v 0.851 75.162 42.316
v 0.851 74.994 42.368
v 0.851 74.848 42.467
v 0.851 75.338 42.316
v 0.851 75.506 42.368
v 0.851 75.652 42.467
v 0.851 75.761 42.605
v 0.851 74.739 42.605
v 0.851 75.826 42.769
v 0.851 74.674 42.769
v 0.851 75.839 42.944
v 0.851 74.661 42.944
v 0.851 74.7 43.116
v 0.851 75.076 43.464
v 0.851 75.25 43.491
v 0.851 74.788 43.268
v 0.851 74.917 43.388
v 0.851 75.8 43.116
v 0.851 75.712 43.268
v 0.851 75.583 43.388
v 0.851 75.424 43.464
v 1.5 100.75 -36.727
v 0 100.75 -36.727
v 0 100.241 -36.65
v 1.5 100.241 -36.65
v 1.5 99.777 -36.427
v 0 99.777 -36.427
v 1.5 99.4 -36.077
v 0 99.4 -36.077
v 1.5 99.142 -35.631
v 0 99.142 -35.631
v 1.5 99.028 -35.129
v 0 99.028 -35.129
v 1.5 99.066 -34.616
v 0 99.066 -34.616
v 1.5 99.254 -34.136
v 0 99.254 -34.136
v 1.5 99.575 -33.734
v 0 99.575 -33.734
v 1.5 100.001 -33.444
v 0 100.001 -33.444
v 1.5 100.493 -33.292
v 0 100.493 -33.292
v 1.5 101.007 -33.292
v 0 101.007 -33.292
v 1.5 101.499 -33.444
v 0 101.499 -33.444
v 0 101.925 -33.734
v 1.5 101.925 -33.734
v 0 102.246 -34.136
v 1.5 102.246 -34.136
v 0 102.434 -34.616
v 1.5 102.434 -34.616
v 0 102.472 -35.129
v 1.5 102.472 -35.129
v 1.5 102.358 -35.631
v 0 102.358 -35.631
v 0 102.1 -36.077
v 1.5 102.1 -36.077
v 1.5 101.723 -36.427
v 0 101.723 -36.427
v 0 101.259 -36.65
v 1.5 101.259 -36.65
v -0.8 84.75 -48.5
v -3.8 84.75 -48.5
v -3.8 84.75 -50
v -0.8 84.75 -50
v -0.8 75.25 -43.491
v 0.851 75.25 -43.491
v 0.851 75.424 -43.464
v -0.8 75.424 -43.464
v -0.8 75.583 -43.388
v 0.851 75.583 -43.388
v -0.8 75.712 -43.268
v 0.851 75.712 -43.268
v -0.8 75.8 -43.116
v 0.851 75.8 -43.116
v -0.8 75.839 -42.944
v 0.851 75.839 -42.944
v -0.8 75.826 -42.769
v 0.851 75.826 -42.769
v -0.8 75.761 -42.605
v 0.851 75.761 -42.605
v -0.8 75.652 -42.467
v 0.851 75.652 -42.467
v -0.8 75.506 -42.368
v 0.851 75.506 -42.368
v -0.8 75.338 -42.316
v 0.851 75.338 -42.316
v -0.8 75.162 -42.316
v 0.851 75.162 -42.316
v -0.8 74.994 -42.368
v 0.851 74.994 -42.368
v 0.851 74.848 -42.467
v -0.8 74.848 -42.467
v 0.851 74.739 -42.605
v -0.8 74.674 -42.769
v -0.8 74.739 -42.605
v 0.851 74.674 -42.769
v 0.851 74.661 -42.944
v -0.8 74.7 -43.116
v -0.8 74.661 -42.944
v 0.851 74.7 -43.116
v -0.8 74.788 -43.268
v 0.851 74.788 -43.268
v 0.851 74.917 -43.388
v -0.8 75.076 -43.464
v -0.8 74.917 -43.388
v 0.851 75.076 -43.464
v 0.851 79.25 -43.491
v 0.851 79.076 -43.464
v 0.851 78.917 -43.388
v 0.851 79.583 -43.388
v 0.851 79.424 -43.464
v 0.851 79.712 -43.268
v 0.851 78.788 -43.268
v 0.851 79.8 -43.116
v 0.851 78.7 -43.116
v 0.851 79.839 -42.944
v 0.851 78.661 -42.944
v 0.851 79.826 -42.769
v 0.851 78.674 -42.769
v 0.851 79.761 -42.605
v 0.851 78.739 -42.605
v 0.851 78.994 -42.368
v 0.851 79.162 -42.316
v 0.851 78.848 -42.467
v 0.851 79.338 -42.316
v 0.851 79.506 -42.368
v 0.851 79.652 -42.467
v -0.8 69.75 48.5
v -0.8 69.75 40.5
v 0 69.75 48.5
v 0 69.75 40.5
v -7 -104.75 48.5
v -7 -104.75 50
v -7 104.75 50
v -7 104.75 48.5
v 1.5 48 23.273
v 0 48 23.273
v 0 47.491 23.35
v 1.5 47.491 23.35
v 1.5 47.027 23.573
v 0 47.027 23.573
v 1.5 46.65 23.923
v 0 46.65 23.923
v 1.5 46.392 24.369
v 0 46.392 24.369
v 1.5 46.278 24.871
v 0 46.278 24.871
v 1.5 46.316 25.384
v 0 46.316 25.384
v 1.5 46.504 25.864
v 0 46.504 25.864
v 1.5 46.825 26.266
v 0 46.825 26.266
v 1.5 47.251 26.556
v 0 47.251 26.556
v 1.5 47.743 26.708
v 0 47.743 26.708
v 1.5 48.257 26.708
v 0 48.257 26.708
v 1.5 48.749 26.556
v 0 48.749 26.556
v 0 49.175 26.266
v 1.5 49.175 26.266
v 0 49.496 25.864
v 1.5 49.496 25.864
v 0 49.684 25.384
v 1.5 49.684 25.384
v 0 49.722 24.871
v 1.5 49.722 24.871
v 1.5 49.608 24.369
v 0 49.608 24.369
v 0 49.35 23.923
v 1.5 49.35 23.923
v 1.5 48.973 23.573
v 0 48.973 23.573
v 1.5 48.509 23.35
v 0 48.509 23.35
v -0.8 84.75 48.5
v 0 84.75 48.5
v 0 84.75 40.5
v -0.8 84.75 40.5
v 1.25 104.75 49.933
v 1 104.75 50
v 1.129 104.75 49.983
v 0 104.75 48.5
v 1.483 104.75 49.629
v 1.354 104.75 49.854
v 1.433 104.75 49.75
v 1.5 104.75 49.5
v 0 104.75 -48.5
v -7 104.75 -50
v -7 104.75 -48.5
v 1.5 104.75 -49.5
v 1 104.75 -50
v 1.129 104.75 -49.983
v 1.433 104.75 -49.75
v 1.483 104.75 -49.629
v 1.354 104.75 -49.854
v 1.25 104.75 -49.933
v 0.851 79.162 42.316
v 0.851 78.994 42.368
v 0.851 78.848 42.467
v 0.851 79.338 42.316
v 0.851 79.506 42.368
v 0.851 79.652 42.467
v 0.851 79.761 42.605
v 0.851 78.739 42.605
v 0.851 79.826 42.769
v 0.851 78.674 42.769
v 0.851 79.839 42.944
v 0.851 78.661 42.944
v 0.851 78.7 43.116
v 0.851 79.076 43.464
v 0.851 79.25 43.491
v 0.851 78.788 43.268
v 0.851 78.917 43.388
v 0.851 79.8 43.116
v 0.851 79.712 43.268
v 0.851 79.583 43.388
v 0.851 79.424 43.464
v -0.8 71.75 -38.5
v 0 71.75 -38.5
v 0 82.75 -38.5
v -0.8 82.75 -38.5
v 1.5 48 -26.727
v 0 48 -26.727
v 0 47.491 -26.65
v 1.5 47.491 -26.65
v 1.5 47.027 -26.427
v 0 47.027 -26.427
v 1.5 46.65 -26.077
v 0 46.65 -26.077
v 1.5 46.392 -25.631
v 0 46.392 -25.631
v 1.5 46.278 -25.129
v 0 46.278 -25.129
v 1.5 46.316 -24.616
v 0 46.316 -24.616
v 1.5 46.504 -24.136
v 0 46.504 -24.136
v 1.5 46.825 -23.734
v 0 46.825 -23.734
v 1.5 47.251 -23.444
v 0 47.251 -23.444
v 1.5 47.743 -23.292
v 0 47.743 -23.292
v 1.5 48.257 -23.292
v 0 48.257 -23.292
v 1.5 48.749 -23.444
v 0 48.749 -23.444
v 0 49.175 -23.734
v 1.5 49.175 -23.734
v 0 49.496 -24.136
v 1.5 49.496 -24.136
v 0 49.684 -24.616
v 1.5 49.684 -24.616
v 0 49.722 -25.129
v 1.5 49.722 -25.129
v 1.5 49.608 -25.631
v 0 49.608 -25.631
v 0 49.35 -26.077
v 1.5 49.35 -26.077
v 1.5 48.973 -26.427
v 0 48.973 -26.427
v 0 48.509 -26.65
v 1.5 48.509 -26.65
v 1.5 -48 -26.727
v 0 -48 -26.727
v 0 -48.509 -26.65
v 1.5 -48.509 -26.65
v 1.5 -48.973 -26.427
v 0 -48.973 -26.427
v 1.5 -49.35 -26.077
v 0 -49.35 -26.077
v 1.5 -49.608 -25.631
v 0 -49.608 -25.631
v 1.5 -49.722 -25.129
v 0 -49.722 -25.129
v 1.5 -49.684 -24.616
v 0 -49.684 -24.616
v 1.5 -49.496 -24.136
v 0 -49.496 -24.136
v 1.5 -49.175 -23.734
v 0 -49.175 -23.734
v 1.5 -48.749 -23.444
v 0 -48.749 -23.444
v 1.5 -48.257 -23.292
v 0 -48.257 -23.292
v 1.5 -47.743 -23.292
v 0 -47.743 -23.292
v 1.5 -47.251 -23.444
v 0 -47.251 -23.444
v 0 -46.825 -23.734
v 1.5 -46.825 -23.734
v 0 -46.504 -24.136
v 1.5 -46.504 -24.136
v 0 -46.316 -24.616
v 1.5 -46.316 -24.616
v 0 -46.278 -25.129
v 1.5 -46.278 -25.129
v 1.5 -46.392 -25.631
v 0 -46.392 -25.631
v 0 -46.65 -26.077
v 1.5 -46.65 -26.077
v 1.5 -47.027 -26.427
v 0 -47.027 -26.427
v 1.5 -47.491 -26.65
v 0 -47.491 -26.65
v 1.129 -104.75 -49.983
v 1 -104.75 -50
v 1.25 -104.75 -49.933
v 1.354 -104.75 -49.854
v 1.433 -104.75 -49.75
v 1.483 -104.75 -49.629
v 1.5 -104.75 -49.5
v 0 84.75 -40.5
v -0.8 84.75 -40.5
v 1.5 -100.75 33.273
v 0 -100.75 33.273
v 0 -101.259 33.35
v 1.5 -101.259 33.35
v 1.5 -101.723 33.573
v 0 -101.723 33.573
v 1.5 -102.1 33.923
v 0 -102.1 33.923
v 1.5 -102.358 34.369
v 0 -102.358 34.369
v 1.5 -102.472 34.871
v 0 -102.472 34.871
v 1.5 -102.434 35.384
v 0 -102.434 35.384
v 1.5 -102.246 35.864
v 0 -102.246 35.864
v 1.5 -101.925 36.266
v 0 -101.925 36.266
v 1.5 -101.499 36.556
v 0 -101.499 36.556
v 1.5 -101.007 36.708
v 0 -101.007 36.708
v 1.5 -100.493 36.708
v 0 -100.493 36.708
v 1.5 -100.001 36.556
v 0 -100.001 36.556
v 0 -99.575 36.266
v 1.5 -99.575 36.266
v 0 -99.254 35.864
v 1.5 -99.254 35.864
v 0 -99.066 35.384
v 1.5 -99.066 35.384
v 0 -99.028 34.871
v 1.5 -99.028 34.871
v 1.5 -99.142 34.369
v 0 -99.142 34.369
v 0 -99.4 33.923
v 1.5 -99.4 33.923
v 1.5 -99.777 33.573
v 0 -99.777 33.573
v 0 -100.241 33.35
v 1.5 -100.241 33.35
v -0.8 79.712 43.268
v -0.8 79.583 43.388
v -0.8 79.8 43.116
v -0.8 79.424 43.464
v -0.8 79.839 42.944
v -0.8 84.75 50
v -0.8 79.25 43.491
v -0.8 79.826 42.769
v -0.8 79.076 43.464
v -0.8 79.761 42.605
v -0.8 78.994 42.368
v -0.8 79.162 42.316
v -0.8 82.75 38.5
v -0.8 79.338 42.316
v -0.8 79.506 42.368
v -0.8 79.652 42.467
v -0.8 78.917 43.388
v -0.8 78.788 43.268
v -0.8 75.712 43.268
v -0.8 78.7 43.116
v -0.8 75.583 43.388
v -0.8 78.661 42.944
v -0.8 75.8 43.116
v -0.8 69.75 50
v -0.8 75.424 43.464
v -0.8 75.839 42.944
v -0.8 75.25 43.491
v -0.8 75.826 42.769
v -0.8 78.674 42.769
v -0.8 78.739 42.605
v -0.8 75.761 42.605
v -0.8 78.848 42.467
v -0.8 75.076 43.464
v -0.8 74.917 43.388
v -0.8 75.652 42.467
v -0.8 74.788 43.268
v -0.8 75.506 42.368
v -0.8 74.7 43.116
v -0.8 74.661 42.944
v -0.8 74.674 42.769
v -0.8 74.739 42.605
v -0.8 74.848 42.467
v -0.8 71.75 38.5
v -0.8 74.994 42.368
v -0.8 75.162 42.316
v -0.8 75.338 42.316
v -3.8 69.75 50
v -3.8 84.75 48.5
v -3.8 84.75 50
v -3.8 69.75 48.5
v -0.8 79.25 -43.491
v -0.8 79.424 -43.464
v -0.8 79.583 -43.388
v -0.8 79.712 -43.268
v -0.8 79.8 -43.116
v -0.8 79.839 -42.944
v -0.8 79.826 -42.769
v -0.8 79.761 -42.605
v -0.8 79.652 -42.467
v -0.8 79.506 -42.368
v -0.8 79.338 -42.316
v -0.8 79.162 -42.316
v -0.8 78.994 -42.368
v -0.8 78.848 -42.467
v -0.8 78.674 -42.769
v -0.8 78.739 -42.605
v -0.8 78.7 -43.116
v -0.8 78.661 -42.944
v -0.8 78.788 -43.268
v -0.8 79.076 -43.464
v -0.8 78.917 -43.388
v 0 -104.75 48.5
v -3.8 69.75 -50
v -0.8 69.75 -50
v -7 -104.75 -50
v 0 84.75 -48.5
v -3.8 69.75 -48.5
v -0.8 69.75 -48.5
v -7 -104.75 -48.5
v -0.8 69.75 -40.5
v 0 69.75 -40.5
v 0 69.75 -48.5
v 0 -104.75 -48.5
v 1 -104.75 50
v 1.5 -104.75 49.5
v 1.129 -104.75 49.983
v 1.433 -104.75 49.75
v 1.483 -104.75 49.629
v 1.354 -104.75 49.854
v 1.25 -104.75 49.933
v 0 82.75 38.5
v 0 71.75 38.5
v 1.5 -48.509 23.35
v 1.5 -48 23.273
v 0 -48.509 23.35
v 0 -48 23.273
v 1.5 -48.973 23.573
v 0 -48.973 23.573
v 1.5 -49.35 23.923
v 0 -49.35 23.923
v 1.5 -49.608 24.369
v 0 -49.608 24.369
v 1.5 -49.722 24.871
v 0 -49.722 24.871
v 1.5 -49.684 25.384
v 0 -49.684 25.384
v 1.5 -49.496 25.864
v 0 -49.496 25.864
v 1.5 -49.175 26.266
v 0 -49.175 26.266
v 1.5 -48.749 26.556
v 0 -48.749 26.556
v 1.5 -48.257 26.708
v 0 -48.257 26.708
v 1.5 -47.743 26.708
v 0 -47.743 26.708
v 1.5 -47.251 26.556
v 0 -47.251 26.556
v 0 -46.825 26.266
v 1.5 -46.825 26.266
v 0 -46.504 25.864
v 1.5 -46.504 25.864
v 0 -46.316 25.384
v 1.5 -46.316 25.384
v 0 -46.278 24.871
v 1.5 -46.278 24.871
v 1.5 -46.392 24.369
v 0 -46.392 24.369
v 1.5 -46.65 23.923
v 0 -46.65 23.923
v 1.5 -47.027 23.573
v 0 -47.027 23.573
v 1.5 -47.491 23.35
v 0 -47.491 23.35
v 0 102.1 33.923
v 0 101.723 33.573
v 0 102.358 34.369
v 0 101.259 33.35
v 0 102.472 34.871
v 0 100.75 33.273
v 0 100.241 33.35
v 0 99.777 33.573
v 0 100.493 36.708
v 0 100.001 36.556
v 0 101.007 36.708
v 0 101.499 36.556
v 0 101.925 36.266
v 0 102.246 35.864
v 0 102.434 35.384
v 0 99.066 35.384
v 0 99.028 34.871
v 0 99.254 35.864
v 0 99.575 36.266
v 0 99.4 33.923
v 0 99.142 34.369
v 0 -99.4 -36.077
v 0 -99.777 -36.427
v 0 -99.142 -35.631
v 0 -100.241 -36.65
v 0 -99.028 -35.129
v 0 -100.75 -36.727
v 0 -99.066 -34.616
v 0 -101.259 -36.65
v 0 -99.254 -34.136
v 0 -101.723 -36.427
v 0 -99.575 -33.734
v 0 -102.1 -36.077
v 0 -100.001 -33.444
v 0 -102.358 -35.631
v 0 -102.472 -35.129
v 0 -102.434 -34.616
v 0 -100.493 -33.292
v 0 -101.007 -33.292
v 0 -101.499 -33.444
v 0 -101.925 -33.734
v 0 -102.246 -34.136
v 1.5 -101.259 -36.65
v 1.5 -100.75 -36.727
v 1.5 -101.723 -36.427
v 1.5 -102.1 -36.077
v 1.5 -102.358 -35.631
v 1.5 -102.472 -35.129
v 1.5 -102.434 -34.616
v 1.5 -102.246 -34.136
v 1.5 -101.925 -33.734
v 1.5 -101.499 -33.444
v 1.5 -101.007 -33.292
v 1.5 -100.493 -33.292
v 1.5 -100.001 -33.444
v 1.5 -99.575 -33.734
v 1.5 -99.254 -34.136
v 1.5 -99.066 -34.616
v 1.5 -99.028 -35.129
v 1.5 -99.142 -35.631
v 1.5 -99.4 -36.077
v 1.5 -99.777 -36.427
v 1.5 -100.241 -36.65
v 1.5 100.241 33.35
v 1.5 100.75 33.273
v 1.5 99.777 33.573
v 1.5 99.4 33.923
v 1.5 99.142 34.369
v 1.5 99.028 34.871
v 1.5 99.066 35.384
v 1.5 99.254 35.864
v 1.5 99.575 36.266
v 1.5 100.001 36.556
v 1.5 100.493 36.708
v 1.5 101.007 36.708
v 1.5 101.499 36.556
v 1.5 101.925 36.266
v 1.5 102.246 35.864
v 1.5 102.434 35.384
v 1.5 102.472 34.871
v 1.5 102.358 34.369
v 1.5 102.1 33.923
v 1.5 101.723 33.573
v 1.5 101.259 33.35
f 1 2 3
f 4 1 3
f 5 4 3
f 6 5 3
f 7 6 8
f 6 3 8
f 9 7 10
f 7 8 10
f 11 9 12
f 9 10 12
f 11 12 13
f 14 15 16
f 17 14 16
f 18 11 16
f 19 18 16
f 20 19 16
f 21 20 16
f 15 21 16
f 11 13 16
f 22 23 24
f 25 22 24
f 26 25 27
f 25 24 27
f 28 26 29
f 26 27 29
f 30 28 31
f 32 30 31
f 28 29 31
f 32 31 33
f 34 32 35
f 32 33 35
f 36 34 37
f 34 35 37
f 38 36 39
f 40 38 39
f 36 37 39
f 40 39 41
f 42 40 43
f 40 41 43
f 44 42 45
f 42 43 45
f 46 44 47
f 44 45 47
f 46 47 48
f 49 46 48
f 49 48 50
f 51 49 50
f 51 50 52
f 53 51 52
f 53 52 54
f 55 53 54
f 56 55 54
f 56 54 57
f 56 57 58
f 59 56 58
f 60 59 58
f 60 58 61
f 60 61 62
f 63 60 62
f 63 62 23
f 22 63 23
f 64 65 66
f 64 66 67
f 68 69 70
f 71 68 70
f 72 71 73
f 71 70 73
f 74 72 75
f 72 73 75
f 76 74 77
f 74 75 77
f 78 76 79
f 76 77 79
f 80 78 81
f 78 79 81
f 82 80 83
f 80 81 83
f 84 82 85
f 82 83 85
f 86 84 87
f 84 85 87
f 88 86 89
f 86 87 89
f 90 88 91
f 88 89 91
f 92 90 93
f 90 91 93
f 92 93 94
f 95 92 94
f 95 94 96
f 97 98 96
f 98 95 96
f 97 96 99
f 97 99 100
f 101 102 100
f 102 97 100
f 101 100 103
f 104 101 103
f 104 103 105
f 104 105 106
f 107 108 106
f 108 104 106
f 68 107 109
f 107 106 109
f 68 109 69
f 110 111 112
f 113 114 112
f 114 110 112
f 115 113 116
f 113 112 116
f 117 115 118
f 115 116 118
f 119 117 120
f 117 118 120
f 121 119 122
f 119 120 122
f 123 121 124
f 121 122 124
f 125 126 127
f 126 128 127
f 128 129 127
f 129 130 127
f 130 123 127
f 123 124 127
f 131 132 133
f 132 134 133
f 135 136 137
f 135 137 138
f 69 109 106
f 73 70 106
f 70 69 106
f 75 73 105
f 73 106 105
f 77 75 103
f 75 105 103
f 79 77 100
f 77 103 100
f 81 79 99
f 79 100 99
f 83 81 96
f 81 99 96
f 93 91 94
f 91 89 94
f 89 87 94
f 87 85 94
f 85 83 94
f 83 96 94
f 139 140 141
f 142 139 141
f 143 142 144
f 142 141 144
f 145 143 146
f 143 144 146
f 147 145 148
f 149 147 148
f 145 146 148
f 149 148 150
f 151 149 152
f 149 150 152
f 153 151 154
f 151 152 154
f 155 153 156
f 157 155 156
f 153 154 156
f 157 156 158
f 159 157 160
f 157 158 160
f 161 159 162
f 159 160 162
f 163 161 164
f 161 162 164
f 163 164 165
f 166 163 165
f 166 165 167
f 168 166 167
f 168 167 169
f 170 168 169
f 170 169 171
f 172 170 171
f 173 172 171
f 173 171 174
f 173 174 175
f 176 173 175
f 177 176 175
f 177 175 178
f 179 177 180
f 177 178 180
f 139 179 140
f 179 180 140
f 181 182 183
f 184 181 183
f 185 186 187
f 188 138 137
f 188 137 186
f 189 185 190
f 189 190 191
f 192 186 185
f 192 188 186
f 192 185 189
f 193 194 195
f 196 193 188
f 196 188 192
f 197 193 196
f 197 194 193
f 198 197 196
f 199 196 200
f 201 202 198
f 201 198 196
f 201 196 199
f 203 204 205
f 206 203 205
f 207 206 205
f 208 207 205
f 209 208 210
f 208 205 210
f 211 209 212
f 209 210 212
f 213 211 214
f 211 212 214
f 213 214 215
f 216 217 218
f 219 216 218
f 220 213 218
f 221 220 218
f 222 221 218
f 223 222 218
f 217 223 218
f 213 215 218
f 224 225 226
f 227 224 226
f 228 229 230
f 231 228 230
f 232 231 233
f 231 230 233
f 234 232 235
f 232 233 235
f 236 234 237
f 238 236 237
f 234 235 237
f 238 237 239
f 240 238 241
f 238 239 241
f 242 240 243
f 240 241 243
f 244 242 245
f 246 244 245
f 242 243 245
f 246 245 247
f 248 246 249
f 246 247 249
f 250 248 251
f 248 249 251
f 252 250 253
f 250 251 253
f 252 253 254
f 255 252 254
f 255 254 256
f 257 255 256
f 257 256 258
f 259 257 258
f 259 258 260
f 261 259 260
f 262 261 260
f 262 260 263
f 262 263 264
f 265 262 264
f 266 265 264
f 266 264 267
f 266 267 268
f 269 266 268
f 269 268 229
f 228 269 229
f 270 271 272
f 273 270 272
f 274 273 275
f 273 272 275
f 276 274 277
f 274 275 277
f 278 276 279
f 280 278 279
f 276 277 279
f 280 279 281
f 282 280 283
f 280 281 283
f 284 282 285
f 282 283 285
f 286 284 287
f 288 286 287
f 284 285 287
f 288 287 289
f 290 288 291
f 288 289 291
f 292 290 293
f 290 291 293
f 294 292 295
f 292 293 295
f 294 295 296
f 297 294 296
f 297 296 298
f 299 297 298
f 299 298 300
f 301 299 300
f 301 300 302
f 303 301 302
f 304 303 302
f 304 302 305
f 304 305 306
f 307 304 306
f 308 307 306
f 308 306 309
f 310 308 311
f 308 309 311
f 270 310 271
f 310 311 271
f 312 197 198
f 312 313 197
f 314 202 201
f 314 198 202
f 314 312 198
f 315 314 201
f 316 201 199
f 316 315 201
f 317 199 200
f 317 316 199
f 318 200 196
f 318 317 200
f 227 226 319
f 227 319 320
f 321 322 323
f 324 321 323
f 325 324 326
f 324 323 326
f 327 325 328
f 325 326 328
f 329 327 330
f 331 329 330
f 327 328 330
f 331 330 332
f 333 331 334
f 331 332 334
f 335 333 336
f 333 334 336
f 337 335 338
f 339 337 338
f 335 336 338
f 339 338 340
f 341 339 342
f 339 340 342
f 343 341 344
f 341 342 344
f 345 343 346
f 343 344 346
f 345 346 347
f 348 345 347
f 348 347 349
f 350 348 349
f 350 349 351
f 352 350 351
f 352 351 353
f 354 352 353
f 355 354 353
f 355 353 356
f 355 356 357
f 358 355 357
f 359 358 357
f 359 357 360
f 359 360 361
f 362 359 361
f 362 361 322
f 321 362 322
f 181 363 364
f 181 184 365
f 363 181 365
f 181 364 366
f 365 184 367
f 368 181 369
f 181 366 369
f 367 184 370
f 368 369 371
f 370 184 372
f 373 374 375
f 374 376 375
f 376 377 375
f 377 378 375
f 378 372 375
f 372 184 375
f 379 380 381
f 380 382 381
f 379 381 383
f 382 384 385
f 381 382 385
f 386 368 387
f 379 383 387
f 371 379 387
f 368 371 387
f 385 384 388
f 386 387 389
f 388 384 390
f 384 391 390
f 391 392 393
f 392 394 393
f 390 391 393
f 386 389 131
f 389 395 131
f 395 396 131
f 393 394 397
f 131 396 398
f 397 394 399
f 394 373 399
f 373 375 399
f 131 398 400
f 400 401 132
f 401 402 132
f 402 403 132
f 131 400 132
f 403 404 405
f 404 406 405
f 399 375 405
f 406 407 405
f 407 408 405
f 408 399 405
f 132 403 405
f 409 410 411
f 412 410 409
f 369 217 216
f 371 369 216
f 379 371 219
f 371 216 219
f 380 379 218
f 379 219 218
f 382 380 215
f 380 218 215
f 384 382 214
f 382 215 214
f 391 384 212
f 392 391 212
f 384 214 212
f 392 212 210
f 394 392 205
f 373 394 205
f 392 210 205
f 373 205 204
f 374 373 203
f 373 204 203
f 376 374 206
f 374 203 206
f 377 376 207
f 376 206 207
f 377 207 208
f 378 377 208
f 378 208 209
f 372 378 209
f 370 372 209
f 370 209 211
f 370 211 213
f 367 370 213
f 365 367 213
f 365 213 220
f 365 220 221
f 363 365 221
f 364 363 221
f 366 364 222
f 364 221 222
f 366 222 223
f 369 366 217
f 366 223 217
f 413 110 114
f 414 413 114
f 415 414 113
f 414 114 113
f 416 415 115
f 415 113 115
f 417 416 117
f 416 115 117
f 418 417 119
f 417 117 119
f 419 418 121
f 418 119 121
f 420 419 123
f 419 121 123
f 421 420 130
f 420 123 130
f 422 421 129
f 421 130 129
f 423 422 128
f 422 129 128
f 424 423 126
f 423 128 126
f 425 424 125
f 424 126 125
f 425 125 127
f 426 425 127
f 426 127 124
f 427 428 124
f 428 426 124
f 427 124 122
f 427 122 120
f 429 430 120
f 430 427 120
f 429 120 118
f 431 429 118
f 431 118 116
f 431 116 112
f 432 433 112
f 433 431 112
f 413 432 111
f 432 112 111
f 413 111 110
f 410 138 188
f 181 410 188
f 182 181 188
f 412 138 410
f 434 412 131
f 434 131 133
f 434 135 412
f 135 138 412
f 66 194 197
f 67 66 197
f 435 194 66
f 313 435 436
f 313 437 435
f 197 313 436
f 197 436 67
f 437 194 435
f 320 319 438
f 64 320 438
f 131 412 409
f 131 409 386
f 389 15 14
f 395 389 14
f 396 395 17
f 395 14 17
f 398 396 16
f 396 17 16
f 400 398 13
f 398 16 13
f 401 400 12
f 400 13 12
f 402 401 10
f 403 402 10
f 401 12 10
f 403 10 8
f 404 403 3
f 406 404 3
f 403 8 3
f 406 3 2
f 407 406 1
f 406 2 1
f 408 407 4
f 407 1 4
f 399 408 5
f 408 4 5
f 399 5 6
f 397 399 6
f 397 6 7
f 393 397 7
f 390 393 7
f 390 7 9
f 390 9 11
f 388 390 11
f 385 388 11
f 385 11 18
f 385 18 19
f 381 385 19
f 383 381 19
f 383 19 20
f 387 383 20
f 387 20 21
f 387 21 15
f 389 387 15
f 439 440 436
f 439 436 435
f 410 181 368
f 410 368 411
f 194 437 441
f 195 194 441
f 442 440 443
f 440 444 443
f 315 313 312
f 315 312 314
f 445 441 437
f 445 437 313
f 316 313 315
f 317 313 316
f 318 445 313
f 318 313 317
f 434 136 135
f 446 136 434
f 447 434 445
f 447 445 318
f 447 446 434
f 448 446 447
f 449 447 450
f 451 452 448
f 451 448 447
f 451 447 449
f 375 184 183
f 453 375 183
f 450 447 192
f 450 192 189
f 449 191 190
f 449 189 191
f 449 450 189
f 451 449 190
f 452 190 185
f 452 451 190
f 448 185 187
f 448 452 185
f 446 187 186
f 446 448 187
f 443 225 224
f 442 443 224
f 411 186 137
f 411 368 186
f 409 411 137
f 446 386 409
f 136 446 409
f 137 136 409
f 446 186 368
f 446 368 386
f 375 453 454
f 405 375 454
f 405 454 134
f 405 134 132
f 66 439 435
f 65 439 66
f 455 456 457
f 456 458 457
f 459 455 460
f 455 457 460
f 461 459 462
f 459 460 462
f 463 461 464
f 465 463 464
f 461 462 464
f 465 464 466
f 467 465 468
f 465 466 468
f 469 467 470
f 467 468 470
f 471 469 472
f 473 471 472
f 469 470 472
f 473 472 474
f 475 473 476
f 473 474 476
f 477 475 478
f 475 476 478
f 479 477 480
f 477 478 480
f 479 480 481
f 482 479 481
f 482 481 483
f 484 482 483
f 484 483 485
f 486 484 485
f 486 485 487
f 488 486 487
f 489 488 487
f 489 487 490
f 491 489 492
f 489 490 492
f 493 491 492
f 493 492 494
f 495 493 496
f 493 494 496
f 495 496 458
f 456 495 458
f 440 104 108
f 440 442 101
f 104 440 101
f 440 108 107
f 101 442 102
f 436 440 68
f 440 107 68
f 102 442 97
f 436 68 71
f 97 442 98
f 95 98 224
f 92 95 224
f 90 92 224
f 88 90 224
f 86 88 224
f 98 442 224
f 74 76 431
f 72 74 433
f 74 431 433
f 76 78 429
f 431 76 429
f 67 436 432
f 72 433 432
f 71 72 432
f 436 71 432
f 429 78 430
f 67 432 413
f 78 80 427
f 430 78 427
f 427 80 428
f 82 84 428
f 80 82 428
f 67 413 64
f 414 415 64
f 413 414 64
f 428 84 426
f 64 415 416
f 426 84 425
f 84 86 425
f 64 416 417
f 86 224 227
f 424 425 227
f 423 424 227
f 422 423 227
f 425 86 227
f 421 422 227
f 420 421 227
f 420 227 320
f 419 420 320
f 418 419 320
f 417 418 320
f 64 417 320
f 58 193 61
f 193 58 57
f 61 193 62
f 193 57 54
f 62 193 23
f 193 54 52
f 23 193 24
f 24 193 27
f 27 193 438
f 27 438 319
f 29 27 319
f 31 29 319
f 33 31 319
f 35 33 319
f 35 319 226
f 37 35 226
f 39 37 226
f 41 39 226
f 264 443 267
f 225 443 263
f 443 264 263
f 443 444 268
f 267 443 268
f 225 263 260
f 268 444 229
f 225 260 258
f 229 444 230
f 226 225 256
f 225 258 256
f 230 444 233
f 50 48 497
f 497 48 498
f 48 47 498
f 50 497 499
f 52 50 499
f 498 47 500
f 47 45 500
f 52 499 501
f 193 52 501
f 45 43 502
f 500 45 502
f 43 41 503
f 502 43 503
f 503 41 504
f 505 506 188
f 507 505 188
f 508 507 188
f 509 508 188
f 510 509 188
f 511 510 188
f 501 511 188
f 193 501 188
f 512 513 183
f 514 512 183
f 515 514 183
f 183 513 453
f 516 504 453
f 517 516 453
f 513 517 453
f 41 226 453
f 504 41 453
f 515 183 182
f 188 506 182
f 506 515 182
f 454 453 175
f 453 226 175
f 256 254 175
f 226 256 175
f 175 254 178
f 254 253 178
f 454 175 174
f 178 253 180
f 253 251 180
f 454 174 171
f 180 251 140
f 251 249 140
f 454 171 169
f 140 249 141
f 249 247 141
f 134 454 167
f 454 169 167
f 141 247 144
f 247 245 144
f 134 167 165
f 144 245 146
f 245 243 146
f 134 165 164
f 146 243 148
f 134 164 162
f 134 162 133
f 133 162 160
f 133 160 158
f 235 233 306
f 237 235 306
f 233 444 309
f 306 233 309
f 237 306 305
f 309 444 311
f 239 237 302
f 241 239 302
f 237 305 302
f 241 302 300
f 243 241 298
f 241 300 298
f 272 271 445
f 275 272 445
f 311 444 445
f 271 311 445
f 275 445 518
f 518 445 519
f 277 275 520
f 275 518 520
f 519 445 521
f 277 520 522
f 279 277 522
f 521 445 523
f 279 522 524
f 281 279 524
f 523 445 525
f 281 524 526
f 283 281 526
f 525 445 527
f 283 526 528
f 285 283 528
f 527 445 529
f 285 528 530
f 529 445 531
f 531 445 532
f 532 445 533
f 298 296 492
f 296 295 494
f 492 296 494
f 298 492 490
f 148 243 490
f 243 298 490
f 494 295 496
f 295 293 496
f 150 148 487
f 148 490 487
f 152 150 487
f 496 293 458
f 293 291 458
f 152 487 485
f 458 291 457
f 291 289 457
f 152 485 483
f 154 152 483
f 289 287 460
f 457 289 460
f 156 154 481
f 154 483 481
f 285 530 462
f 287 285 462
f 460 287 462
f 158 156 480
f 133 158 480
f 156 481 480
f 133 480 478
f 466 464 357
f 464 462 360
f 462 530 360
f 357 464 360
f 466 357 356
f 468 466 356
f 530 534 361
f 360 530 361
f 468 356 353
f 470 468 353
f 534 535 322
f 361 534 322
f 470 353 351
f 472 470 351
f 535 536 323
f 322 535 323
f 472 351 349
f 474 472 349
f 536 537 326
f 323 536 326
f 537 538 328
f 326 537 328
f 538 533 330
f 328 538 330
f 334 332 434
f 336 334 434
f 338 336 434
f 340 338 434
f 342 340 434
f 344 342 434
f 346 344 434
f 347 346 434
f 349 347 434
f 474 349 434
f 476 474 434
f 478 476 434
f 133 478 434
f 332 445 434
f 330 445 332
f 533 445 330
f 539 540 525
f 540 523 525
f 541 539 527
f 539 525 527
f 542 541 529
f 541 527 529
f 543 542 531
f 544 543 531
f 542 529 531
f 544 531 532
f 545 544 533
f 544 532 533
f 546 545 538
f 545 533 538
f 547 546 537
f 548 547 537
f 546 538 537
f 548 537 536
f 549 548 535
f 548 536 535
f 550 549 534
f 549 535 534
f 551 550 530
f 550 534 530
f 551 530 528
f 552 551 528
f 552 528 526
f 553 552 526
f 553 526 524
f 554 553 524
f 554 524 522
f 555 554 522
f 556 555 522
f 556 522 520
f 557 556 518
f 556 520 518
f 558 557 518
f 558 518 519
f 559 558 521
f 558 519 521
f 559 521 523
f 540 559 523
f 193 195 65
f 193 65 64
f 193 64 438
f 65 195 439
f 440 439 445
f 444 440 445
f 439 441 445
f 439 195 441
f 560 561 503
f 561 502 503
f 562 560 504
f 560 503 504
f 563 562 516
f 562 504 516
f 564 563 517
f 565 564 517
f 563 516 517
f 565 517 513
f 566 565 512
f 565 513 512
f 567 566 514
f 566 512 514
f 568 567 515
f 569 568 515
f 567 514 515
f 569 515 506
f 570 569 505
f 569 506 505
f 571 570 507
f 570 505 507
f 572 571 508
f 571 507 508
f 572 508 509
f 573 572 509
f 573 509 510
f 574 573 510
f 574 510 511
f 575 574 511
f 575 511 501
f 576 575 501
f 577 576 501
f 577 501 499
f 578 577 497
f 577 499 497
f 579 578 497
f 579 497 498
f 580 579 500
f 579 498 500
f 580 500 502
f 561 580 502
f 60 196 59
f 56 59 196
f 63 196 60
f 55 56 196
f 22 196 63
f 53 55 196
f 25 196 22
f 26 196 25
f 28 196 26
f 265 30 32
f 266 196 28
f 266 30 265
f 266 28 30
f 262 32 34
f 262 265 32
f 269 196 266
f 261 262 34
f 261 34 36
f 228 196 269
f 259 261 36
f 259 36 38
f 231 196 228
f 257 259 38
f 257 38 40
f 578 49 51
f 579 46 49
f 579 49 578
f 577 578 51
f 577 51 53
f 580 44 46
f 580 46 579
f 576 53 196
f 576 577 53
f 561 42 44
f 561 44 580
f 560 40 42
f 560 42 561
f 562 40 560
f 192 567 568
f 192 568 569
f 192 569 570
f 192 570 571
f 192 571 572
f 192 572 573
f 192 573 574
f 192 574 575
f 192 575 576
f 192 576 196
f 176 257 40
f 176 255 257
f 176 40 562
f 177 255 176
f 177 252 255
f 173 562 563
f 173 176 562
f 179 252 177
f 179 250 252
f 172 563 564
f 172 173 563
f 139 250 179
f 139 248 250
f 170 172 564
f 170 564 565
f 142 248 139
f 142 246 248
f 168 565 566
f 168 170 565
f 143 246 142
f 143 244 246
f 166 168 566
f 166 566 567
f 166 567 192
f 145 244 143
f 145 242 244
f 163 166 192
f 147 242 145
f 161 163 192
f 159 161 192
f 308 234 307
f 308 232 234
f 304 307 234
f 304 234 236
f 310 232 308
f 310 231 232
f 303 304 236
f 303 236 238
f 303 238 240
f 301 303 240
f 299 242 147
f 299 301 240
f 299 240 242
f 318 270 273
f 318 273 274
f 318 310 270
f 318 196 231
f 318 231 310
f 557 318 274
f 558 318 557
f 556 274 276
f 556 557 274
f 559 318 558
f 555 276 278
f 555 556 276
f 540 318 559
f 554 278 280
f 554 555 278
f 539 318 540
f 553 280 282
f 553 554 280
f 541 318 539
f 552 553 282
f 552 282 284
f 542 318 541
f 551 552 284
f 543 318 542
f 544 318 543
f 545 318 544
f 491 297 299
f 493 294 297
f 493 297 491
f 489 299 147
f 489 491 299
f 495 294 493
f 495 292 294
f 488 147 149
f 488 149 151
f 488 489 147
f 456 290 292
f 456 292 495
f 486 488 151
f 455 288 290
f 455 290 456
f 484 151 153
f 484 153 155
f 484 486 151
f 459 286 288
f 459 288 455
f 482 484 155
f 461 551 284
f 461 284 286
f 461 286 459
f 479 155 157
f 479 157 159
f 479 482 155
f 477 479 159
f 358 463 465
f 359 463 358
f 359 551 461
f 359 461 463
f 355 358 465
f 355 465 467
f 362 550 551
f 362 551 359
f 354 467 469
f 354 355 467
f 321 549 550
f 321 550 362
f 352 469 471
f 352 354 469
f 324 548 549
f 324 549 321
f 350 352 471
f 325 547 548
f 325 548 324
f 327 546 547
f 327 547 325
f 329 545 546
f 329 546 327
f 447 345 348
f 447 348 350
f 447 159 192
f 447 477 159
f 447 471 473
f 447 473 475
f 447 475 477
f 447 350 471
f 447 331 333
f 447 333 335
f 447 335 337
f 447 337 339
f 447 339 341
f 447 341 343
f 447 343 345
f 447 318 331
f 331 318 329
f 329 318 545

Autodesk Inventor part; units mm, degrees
ref_plane "YZ Plane" through (0, 0, 0) normal (1, 0, 0) x (0, 1, 0)
ref_plane "XZ Plane" through (0, 0, 0) normal (0, 1, 0) x (-1, 0, 0)
ref_plane "XY Plane" through (0, 0, 0) normal (0, 0, 1) x (1, 0, 0)
sketch "Sketch1" plane through (0, 0, 0) normal (1, 0, 0) x (0, 1, 0)
  line L0 (48, 50) -> (-48, 50)
  line L1 (-48, 50) -> (-48, -50)
  line L2 (-48, -50) -> (48, -50)
  line L3 (48, -50) -> (48, 50)
  point P0 (0, 0)
  dimension "d0" = 96
  dimension "d1" = 100
  dimension "d2" = 50
  dimension "d3" = 48
extrude "Extrusion1" add sketch "Sketch1" along normal blind 1.5
sketch "Sketch2" plane through (0, -48, 50) normal (0, 0, 1) x (1, 0, 0)
  line L0 (0, 96) -> (1.5, 96) projected
  line L1 (1.5, 96) -> (-7, 96)
  line L2 (-7, 96) -> (-7, 0)
  line L3 (-7, 0) -> (1.5, 0)
  line L4 (1.5, 0) -> (1.5, 96)
  point P0 (0, 48)
  dimension "d6" = 8.5
  dimension "d7" = 96
extrude "Extrusion2" add sketch "Sketch2" against normal blind 1.5
mirror "Mirror1" about plane through (0, 0, 0) normal (0, 0, 1) of "Extrusion2"
fillet "Fillet1" radius 0.5 2 edges at (1.5, 0, 50) (1.5, 0, -50)
sketch "Sketch12" plane through (-7, -48, 48.5) normal (0, -1, 0) x (1, 0, 0)
  arc A0 (8, -98.5) -> (8.5, -98) centre (8, -98) ccw projected
  line L0 (8.5, 1) -> (8.5, -98) projected
  arc A1 (8.5, 1) -> (8, 1.5) centre (8, 1) ccw projected
  line L1 (0, 1.5) -> (8, 1.5) projected
  line L2 (0, 1.5) -> (0, 0) projected
  line L3 (7, 0) -> (0, 0) projected
  line L4 (7, 0) -> (7, -97) projected
  line L5 (7, -97) -> (0, -97) projected
  line L6 (0, -98.5) -> (0, -97) projected
  line L7 (0, -98.5) -> (8, -98.5) projected
  point P0 (7, -48.5)
extrude "Extrusion8" add sketch "Sketch12" along normal blind 56.75
sketch "Sketch13" plane through (-7, 48, 48.5) normal (0, 1, 0) x (1, 0, 0)
  arc A0 (8.5, 98) -> (8, 98.5) centre (8, 98) ccw projected
  line L0 (0, 98.5) -> (8, 98.5) projected
  line L1 (0, 98.5) -> (0, 97) projected
  line L2 (0, 97) -> (7, 97) projected
  line L3 (7, 97) -> (7, 0) projected
  line L4 (0, 0) -> (7, 0) projected
  line L5 (0, -1.5) -> (0, 0) projected
  line L6 (8, -1.5) -> (0, -1.5) projected
  arc A1 (8, -1.5) -> (8.5, -1) centre (8, -1) ccw projected
  line L7 (8.5, 98) -> (8.5, -1) projected
  point P0 (7, 48.5)
extrude "Extrusion9" add sketch "Sketch13" along normal blind 56.75
sketch "Sketch14" plane through (1.5, 0, 0) normal (1, 0, 0) x (0, 0, -1)
  line L0 (49.5, -104.75) -> (49.5, 104.75) projected
  line L1 (-49.5, 104.75) -> (49.5, 104.75) projected
  line L2 (-49.5, 104.75) -> (-49.5, -104.75) projected
  line L3 (49.5, -104.75) -> (-49.5, -104.75) projected
  line L4 (0, 0) -> (-23.5475, 0) construction
  point P0 (35, -100.75)
  point P1 (-35, -100.75)
  point P2 (35, 100.75)
  point P3 (-35, 100.75)
  dimension "d88" = 70
  dimension "d89" = 35
  dimension "d90" = 4
hole "Hole6" at (1.5, -100.75, -35) at (1.5, -100.75, 35) at (1.5, 100.75, -35) at (1.5, 100.75, 35) direction (-1, 0, 0) diameter 3.454 end through all clearance for "Flat Head Machine Screw (82)" size "#4" standard "Ansi Unified Screw Threads"
sketch "Sketch15" plane through (1.5, 0, 0) normal (1, 0, 0) x (0, 0, -1)
  circle A0 centre (25, -48) radius 1.727 projected
  circle A1 centre (-25, -48) radius 1.727 projected
  circle A2 centre (25, 48) radius 1.727 projected
  circle A3 centre (-25, 48) radius 1.727 projected
  point P0 (0, 0)
hole "Hole7" at (1.5, -48, -25) at (1.5, -48, 25) at (1.5, 48, -25) at (1.5, 48, 25) direction (-1, 0, 0) diameter 3.454 end through all clearance for "Flat Head Machine Screw (82)" size "#4" standard "Ansi Unified Screw Threads"
sketch "Sketch16" plane through (0, 0, 0) normal (-1, 0, 0) x (0, 0, 1)
  line L0 (38.5, 69.75) -> (48.5, 69.75)
  line L1 (48.5, 69.75) -> (48.5, 84.75)
  line L2 (48.5, 84.75) -> (38.5, 84.75)
  line L3 (38.5, 84.75) -> (38.5, 69.75)
  circle A0 centre (-25, 48) radius 1.727 projected
  circle A1 centre (-25, -48) radius 1.727 projected
  circle A2 centre (25, -48) radius 1.727 projected
  circle A3 centre (25, 48) radius 1.727 projected
  circle A4 centre (-35, 100.75) radius 1.727 projected
  circle A5 centre (-35, -100.75) radius 1.727 projected
  circle A6 centre (35, -100.75) radius 1.727 projected
  circle A7 centre (35, 100.75) radius 1.727 projected
  line L4 (-48.5, 104.75) -> (-48.5, -104.75) projected
  line L5 (48.5, -104.75) -> (-48.5, -104.75) projected
  line L6 (48.5, -104.75) -> (48.5, 104.75) projected
  line L7 (-48.5, 104.75) -> (48.5, 104.75) projected
  line L8 (48.5, -104.75) -> (48.5, 104.75) projected
  point P0 (0, 0)
  dimension "d105" = 10
  dimension "d106" = 15
  dimension "d107" = 20
extrude "Extrusion10" add sketch "Sketch16" along normal blind 0.8 contours L3 L2 L1 L0
sketch "Sketch17" plane through (-0.8, 0, 0) normal (-1, 0, 0) x (0, 0, 1)
  line L0 (38.5, 69.75) -> (48.5, 69.75) projected
  line L1 (48.5, 84.75) -> (48.5, 69.75) projected
  line L2 (48.5, 84.75) -> (38.5, 84.75) projected
  line L3 (38.5, 84.75) -> (38.5, 69.75) projected
  line L4 (38.5, 69.75) -> (48.5, 69.75) projected
  point P0 (0, 0)
  point P1 (42.9, 75.25)
  point P2 (42.9, 79.25)
  dimension "d110" = 4
  dimension "d111" = 5.5
  dimension "d123" = 5.6
hole "Hole8" at (-0.8, 75.25, 42.9) at (-0.8, 79.25, 42.9) direction (1, 0, 0) diameter 1.1811 depth 1.651 thread size "0-80 UNF" class "2B" standard "ANSI Unified Screw Threads"
mirror "Mirror2" about plane through (0, 0, 0) normal (0, 0, 1) of "Extrusion10", "Hole8"
sketch "Sketch18" plane through (0, -48, 48.5) normal (0, 0, -1) x (-1, 0, 0)
  line L0 (0.8, 132.75) -> (0.8, 117.75) projected
  line L1 (0, 132.75) -> (0.8, 132.75) projected
  line L2 (0.8, 132.75) -> (3.8, 132.75)
  line L3 (3.8, 132.75) -> (3.8, 117.75)
  line L4 (3.8, 117.75) -> (0.8, 117.75)
  line L5 (0.8, 117.75) -> (0.8, 132.75)
  point P0 (0, 48)
  dimension "d119" = 3
  dimension "d120" = 15
extrude "Extrusion11" cut sketch "Sketch18" against normal through all
mirror "Mirror3" about plane through (0, 0, 0) normal (0, 0, 1) of "Extrusion11"
chamfer "Chamfer1" distance 2 angle 45 4 edges at (-0.4, 69.75, -38.5) (-0.4, 84.75, -38.5) (-0.4, 69.75, 38.5) (-0.4, 84.75, 38.5)
equation "\"d2\" = 0.5 * d1"
equation "\"d3\" = 0.5 * d0"
equation "\"d89\" = 0.5 * d88"
properties part number "memesat shear panel type 1" material "Aluminum 6061"
